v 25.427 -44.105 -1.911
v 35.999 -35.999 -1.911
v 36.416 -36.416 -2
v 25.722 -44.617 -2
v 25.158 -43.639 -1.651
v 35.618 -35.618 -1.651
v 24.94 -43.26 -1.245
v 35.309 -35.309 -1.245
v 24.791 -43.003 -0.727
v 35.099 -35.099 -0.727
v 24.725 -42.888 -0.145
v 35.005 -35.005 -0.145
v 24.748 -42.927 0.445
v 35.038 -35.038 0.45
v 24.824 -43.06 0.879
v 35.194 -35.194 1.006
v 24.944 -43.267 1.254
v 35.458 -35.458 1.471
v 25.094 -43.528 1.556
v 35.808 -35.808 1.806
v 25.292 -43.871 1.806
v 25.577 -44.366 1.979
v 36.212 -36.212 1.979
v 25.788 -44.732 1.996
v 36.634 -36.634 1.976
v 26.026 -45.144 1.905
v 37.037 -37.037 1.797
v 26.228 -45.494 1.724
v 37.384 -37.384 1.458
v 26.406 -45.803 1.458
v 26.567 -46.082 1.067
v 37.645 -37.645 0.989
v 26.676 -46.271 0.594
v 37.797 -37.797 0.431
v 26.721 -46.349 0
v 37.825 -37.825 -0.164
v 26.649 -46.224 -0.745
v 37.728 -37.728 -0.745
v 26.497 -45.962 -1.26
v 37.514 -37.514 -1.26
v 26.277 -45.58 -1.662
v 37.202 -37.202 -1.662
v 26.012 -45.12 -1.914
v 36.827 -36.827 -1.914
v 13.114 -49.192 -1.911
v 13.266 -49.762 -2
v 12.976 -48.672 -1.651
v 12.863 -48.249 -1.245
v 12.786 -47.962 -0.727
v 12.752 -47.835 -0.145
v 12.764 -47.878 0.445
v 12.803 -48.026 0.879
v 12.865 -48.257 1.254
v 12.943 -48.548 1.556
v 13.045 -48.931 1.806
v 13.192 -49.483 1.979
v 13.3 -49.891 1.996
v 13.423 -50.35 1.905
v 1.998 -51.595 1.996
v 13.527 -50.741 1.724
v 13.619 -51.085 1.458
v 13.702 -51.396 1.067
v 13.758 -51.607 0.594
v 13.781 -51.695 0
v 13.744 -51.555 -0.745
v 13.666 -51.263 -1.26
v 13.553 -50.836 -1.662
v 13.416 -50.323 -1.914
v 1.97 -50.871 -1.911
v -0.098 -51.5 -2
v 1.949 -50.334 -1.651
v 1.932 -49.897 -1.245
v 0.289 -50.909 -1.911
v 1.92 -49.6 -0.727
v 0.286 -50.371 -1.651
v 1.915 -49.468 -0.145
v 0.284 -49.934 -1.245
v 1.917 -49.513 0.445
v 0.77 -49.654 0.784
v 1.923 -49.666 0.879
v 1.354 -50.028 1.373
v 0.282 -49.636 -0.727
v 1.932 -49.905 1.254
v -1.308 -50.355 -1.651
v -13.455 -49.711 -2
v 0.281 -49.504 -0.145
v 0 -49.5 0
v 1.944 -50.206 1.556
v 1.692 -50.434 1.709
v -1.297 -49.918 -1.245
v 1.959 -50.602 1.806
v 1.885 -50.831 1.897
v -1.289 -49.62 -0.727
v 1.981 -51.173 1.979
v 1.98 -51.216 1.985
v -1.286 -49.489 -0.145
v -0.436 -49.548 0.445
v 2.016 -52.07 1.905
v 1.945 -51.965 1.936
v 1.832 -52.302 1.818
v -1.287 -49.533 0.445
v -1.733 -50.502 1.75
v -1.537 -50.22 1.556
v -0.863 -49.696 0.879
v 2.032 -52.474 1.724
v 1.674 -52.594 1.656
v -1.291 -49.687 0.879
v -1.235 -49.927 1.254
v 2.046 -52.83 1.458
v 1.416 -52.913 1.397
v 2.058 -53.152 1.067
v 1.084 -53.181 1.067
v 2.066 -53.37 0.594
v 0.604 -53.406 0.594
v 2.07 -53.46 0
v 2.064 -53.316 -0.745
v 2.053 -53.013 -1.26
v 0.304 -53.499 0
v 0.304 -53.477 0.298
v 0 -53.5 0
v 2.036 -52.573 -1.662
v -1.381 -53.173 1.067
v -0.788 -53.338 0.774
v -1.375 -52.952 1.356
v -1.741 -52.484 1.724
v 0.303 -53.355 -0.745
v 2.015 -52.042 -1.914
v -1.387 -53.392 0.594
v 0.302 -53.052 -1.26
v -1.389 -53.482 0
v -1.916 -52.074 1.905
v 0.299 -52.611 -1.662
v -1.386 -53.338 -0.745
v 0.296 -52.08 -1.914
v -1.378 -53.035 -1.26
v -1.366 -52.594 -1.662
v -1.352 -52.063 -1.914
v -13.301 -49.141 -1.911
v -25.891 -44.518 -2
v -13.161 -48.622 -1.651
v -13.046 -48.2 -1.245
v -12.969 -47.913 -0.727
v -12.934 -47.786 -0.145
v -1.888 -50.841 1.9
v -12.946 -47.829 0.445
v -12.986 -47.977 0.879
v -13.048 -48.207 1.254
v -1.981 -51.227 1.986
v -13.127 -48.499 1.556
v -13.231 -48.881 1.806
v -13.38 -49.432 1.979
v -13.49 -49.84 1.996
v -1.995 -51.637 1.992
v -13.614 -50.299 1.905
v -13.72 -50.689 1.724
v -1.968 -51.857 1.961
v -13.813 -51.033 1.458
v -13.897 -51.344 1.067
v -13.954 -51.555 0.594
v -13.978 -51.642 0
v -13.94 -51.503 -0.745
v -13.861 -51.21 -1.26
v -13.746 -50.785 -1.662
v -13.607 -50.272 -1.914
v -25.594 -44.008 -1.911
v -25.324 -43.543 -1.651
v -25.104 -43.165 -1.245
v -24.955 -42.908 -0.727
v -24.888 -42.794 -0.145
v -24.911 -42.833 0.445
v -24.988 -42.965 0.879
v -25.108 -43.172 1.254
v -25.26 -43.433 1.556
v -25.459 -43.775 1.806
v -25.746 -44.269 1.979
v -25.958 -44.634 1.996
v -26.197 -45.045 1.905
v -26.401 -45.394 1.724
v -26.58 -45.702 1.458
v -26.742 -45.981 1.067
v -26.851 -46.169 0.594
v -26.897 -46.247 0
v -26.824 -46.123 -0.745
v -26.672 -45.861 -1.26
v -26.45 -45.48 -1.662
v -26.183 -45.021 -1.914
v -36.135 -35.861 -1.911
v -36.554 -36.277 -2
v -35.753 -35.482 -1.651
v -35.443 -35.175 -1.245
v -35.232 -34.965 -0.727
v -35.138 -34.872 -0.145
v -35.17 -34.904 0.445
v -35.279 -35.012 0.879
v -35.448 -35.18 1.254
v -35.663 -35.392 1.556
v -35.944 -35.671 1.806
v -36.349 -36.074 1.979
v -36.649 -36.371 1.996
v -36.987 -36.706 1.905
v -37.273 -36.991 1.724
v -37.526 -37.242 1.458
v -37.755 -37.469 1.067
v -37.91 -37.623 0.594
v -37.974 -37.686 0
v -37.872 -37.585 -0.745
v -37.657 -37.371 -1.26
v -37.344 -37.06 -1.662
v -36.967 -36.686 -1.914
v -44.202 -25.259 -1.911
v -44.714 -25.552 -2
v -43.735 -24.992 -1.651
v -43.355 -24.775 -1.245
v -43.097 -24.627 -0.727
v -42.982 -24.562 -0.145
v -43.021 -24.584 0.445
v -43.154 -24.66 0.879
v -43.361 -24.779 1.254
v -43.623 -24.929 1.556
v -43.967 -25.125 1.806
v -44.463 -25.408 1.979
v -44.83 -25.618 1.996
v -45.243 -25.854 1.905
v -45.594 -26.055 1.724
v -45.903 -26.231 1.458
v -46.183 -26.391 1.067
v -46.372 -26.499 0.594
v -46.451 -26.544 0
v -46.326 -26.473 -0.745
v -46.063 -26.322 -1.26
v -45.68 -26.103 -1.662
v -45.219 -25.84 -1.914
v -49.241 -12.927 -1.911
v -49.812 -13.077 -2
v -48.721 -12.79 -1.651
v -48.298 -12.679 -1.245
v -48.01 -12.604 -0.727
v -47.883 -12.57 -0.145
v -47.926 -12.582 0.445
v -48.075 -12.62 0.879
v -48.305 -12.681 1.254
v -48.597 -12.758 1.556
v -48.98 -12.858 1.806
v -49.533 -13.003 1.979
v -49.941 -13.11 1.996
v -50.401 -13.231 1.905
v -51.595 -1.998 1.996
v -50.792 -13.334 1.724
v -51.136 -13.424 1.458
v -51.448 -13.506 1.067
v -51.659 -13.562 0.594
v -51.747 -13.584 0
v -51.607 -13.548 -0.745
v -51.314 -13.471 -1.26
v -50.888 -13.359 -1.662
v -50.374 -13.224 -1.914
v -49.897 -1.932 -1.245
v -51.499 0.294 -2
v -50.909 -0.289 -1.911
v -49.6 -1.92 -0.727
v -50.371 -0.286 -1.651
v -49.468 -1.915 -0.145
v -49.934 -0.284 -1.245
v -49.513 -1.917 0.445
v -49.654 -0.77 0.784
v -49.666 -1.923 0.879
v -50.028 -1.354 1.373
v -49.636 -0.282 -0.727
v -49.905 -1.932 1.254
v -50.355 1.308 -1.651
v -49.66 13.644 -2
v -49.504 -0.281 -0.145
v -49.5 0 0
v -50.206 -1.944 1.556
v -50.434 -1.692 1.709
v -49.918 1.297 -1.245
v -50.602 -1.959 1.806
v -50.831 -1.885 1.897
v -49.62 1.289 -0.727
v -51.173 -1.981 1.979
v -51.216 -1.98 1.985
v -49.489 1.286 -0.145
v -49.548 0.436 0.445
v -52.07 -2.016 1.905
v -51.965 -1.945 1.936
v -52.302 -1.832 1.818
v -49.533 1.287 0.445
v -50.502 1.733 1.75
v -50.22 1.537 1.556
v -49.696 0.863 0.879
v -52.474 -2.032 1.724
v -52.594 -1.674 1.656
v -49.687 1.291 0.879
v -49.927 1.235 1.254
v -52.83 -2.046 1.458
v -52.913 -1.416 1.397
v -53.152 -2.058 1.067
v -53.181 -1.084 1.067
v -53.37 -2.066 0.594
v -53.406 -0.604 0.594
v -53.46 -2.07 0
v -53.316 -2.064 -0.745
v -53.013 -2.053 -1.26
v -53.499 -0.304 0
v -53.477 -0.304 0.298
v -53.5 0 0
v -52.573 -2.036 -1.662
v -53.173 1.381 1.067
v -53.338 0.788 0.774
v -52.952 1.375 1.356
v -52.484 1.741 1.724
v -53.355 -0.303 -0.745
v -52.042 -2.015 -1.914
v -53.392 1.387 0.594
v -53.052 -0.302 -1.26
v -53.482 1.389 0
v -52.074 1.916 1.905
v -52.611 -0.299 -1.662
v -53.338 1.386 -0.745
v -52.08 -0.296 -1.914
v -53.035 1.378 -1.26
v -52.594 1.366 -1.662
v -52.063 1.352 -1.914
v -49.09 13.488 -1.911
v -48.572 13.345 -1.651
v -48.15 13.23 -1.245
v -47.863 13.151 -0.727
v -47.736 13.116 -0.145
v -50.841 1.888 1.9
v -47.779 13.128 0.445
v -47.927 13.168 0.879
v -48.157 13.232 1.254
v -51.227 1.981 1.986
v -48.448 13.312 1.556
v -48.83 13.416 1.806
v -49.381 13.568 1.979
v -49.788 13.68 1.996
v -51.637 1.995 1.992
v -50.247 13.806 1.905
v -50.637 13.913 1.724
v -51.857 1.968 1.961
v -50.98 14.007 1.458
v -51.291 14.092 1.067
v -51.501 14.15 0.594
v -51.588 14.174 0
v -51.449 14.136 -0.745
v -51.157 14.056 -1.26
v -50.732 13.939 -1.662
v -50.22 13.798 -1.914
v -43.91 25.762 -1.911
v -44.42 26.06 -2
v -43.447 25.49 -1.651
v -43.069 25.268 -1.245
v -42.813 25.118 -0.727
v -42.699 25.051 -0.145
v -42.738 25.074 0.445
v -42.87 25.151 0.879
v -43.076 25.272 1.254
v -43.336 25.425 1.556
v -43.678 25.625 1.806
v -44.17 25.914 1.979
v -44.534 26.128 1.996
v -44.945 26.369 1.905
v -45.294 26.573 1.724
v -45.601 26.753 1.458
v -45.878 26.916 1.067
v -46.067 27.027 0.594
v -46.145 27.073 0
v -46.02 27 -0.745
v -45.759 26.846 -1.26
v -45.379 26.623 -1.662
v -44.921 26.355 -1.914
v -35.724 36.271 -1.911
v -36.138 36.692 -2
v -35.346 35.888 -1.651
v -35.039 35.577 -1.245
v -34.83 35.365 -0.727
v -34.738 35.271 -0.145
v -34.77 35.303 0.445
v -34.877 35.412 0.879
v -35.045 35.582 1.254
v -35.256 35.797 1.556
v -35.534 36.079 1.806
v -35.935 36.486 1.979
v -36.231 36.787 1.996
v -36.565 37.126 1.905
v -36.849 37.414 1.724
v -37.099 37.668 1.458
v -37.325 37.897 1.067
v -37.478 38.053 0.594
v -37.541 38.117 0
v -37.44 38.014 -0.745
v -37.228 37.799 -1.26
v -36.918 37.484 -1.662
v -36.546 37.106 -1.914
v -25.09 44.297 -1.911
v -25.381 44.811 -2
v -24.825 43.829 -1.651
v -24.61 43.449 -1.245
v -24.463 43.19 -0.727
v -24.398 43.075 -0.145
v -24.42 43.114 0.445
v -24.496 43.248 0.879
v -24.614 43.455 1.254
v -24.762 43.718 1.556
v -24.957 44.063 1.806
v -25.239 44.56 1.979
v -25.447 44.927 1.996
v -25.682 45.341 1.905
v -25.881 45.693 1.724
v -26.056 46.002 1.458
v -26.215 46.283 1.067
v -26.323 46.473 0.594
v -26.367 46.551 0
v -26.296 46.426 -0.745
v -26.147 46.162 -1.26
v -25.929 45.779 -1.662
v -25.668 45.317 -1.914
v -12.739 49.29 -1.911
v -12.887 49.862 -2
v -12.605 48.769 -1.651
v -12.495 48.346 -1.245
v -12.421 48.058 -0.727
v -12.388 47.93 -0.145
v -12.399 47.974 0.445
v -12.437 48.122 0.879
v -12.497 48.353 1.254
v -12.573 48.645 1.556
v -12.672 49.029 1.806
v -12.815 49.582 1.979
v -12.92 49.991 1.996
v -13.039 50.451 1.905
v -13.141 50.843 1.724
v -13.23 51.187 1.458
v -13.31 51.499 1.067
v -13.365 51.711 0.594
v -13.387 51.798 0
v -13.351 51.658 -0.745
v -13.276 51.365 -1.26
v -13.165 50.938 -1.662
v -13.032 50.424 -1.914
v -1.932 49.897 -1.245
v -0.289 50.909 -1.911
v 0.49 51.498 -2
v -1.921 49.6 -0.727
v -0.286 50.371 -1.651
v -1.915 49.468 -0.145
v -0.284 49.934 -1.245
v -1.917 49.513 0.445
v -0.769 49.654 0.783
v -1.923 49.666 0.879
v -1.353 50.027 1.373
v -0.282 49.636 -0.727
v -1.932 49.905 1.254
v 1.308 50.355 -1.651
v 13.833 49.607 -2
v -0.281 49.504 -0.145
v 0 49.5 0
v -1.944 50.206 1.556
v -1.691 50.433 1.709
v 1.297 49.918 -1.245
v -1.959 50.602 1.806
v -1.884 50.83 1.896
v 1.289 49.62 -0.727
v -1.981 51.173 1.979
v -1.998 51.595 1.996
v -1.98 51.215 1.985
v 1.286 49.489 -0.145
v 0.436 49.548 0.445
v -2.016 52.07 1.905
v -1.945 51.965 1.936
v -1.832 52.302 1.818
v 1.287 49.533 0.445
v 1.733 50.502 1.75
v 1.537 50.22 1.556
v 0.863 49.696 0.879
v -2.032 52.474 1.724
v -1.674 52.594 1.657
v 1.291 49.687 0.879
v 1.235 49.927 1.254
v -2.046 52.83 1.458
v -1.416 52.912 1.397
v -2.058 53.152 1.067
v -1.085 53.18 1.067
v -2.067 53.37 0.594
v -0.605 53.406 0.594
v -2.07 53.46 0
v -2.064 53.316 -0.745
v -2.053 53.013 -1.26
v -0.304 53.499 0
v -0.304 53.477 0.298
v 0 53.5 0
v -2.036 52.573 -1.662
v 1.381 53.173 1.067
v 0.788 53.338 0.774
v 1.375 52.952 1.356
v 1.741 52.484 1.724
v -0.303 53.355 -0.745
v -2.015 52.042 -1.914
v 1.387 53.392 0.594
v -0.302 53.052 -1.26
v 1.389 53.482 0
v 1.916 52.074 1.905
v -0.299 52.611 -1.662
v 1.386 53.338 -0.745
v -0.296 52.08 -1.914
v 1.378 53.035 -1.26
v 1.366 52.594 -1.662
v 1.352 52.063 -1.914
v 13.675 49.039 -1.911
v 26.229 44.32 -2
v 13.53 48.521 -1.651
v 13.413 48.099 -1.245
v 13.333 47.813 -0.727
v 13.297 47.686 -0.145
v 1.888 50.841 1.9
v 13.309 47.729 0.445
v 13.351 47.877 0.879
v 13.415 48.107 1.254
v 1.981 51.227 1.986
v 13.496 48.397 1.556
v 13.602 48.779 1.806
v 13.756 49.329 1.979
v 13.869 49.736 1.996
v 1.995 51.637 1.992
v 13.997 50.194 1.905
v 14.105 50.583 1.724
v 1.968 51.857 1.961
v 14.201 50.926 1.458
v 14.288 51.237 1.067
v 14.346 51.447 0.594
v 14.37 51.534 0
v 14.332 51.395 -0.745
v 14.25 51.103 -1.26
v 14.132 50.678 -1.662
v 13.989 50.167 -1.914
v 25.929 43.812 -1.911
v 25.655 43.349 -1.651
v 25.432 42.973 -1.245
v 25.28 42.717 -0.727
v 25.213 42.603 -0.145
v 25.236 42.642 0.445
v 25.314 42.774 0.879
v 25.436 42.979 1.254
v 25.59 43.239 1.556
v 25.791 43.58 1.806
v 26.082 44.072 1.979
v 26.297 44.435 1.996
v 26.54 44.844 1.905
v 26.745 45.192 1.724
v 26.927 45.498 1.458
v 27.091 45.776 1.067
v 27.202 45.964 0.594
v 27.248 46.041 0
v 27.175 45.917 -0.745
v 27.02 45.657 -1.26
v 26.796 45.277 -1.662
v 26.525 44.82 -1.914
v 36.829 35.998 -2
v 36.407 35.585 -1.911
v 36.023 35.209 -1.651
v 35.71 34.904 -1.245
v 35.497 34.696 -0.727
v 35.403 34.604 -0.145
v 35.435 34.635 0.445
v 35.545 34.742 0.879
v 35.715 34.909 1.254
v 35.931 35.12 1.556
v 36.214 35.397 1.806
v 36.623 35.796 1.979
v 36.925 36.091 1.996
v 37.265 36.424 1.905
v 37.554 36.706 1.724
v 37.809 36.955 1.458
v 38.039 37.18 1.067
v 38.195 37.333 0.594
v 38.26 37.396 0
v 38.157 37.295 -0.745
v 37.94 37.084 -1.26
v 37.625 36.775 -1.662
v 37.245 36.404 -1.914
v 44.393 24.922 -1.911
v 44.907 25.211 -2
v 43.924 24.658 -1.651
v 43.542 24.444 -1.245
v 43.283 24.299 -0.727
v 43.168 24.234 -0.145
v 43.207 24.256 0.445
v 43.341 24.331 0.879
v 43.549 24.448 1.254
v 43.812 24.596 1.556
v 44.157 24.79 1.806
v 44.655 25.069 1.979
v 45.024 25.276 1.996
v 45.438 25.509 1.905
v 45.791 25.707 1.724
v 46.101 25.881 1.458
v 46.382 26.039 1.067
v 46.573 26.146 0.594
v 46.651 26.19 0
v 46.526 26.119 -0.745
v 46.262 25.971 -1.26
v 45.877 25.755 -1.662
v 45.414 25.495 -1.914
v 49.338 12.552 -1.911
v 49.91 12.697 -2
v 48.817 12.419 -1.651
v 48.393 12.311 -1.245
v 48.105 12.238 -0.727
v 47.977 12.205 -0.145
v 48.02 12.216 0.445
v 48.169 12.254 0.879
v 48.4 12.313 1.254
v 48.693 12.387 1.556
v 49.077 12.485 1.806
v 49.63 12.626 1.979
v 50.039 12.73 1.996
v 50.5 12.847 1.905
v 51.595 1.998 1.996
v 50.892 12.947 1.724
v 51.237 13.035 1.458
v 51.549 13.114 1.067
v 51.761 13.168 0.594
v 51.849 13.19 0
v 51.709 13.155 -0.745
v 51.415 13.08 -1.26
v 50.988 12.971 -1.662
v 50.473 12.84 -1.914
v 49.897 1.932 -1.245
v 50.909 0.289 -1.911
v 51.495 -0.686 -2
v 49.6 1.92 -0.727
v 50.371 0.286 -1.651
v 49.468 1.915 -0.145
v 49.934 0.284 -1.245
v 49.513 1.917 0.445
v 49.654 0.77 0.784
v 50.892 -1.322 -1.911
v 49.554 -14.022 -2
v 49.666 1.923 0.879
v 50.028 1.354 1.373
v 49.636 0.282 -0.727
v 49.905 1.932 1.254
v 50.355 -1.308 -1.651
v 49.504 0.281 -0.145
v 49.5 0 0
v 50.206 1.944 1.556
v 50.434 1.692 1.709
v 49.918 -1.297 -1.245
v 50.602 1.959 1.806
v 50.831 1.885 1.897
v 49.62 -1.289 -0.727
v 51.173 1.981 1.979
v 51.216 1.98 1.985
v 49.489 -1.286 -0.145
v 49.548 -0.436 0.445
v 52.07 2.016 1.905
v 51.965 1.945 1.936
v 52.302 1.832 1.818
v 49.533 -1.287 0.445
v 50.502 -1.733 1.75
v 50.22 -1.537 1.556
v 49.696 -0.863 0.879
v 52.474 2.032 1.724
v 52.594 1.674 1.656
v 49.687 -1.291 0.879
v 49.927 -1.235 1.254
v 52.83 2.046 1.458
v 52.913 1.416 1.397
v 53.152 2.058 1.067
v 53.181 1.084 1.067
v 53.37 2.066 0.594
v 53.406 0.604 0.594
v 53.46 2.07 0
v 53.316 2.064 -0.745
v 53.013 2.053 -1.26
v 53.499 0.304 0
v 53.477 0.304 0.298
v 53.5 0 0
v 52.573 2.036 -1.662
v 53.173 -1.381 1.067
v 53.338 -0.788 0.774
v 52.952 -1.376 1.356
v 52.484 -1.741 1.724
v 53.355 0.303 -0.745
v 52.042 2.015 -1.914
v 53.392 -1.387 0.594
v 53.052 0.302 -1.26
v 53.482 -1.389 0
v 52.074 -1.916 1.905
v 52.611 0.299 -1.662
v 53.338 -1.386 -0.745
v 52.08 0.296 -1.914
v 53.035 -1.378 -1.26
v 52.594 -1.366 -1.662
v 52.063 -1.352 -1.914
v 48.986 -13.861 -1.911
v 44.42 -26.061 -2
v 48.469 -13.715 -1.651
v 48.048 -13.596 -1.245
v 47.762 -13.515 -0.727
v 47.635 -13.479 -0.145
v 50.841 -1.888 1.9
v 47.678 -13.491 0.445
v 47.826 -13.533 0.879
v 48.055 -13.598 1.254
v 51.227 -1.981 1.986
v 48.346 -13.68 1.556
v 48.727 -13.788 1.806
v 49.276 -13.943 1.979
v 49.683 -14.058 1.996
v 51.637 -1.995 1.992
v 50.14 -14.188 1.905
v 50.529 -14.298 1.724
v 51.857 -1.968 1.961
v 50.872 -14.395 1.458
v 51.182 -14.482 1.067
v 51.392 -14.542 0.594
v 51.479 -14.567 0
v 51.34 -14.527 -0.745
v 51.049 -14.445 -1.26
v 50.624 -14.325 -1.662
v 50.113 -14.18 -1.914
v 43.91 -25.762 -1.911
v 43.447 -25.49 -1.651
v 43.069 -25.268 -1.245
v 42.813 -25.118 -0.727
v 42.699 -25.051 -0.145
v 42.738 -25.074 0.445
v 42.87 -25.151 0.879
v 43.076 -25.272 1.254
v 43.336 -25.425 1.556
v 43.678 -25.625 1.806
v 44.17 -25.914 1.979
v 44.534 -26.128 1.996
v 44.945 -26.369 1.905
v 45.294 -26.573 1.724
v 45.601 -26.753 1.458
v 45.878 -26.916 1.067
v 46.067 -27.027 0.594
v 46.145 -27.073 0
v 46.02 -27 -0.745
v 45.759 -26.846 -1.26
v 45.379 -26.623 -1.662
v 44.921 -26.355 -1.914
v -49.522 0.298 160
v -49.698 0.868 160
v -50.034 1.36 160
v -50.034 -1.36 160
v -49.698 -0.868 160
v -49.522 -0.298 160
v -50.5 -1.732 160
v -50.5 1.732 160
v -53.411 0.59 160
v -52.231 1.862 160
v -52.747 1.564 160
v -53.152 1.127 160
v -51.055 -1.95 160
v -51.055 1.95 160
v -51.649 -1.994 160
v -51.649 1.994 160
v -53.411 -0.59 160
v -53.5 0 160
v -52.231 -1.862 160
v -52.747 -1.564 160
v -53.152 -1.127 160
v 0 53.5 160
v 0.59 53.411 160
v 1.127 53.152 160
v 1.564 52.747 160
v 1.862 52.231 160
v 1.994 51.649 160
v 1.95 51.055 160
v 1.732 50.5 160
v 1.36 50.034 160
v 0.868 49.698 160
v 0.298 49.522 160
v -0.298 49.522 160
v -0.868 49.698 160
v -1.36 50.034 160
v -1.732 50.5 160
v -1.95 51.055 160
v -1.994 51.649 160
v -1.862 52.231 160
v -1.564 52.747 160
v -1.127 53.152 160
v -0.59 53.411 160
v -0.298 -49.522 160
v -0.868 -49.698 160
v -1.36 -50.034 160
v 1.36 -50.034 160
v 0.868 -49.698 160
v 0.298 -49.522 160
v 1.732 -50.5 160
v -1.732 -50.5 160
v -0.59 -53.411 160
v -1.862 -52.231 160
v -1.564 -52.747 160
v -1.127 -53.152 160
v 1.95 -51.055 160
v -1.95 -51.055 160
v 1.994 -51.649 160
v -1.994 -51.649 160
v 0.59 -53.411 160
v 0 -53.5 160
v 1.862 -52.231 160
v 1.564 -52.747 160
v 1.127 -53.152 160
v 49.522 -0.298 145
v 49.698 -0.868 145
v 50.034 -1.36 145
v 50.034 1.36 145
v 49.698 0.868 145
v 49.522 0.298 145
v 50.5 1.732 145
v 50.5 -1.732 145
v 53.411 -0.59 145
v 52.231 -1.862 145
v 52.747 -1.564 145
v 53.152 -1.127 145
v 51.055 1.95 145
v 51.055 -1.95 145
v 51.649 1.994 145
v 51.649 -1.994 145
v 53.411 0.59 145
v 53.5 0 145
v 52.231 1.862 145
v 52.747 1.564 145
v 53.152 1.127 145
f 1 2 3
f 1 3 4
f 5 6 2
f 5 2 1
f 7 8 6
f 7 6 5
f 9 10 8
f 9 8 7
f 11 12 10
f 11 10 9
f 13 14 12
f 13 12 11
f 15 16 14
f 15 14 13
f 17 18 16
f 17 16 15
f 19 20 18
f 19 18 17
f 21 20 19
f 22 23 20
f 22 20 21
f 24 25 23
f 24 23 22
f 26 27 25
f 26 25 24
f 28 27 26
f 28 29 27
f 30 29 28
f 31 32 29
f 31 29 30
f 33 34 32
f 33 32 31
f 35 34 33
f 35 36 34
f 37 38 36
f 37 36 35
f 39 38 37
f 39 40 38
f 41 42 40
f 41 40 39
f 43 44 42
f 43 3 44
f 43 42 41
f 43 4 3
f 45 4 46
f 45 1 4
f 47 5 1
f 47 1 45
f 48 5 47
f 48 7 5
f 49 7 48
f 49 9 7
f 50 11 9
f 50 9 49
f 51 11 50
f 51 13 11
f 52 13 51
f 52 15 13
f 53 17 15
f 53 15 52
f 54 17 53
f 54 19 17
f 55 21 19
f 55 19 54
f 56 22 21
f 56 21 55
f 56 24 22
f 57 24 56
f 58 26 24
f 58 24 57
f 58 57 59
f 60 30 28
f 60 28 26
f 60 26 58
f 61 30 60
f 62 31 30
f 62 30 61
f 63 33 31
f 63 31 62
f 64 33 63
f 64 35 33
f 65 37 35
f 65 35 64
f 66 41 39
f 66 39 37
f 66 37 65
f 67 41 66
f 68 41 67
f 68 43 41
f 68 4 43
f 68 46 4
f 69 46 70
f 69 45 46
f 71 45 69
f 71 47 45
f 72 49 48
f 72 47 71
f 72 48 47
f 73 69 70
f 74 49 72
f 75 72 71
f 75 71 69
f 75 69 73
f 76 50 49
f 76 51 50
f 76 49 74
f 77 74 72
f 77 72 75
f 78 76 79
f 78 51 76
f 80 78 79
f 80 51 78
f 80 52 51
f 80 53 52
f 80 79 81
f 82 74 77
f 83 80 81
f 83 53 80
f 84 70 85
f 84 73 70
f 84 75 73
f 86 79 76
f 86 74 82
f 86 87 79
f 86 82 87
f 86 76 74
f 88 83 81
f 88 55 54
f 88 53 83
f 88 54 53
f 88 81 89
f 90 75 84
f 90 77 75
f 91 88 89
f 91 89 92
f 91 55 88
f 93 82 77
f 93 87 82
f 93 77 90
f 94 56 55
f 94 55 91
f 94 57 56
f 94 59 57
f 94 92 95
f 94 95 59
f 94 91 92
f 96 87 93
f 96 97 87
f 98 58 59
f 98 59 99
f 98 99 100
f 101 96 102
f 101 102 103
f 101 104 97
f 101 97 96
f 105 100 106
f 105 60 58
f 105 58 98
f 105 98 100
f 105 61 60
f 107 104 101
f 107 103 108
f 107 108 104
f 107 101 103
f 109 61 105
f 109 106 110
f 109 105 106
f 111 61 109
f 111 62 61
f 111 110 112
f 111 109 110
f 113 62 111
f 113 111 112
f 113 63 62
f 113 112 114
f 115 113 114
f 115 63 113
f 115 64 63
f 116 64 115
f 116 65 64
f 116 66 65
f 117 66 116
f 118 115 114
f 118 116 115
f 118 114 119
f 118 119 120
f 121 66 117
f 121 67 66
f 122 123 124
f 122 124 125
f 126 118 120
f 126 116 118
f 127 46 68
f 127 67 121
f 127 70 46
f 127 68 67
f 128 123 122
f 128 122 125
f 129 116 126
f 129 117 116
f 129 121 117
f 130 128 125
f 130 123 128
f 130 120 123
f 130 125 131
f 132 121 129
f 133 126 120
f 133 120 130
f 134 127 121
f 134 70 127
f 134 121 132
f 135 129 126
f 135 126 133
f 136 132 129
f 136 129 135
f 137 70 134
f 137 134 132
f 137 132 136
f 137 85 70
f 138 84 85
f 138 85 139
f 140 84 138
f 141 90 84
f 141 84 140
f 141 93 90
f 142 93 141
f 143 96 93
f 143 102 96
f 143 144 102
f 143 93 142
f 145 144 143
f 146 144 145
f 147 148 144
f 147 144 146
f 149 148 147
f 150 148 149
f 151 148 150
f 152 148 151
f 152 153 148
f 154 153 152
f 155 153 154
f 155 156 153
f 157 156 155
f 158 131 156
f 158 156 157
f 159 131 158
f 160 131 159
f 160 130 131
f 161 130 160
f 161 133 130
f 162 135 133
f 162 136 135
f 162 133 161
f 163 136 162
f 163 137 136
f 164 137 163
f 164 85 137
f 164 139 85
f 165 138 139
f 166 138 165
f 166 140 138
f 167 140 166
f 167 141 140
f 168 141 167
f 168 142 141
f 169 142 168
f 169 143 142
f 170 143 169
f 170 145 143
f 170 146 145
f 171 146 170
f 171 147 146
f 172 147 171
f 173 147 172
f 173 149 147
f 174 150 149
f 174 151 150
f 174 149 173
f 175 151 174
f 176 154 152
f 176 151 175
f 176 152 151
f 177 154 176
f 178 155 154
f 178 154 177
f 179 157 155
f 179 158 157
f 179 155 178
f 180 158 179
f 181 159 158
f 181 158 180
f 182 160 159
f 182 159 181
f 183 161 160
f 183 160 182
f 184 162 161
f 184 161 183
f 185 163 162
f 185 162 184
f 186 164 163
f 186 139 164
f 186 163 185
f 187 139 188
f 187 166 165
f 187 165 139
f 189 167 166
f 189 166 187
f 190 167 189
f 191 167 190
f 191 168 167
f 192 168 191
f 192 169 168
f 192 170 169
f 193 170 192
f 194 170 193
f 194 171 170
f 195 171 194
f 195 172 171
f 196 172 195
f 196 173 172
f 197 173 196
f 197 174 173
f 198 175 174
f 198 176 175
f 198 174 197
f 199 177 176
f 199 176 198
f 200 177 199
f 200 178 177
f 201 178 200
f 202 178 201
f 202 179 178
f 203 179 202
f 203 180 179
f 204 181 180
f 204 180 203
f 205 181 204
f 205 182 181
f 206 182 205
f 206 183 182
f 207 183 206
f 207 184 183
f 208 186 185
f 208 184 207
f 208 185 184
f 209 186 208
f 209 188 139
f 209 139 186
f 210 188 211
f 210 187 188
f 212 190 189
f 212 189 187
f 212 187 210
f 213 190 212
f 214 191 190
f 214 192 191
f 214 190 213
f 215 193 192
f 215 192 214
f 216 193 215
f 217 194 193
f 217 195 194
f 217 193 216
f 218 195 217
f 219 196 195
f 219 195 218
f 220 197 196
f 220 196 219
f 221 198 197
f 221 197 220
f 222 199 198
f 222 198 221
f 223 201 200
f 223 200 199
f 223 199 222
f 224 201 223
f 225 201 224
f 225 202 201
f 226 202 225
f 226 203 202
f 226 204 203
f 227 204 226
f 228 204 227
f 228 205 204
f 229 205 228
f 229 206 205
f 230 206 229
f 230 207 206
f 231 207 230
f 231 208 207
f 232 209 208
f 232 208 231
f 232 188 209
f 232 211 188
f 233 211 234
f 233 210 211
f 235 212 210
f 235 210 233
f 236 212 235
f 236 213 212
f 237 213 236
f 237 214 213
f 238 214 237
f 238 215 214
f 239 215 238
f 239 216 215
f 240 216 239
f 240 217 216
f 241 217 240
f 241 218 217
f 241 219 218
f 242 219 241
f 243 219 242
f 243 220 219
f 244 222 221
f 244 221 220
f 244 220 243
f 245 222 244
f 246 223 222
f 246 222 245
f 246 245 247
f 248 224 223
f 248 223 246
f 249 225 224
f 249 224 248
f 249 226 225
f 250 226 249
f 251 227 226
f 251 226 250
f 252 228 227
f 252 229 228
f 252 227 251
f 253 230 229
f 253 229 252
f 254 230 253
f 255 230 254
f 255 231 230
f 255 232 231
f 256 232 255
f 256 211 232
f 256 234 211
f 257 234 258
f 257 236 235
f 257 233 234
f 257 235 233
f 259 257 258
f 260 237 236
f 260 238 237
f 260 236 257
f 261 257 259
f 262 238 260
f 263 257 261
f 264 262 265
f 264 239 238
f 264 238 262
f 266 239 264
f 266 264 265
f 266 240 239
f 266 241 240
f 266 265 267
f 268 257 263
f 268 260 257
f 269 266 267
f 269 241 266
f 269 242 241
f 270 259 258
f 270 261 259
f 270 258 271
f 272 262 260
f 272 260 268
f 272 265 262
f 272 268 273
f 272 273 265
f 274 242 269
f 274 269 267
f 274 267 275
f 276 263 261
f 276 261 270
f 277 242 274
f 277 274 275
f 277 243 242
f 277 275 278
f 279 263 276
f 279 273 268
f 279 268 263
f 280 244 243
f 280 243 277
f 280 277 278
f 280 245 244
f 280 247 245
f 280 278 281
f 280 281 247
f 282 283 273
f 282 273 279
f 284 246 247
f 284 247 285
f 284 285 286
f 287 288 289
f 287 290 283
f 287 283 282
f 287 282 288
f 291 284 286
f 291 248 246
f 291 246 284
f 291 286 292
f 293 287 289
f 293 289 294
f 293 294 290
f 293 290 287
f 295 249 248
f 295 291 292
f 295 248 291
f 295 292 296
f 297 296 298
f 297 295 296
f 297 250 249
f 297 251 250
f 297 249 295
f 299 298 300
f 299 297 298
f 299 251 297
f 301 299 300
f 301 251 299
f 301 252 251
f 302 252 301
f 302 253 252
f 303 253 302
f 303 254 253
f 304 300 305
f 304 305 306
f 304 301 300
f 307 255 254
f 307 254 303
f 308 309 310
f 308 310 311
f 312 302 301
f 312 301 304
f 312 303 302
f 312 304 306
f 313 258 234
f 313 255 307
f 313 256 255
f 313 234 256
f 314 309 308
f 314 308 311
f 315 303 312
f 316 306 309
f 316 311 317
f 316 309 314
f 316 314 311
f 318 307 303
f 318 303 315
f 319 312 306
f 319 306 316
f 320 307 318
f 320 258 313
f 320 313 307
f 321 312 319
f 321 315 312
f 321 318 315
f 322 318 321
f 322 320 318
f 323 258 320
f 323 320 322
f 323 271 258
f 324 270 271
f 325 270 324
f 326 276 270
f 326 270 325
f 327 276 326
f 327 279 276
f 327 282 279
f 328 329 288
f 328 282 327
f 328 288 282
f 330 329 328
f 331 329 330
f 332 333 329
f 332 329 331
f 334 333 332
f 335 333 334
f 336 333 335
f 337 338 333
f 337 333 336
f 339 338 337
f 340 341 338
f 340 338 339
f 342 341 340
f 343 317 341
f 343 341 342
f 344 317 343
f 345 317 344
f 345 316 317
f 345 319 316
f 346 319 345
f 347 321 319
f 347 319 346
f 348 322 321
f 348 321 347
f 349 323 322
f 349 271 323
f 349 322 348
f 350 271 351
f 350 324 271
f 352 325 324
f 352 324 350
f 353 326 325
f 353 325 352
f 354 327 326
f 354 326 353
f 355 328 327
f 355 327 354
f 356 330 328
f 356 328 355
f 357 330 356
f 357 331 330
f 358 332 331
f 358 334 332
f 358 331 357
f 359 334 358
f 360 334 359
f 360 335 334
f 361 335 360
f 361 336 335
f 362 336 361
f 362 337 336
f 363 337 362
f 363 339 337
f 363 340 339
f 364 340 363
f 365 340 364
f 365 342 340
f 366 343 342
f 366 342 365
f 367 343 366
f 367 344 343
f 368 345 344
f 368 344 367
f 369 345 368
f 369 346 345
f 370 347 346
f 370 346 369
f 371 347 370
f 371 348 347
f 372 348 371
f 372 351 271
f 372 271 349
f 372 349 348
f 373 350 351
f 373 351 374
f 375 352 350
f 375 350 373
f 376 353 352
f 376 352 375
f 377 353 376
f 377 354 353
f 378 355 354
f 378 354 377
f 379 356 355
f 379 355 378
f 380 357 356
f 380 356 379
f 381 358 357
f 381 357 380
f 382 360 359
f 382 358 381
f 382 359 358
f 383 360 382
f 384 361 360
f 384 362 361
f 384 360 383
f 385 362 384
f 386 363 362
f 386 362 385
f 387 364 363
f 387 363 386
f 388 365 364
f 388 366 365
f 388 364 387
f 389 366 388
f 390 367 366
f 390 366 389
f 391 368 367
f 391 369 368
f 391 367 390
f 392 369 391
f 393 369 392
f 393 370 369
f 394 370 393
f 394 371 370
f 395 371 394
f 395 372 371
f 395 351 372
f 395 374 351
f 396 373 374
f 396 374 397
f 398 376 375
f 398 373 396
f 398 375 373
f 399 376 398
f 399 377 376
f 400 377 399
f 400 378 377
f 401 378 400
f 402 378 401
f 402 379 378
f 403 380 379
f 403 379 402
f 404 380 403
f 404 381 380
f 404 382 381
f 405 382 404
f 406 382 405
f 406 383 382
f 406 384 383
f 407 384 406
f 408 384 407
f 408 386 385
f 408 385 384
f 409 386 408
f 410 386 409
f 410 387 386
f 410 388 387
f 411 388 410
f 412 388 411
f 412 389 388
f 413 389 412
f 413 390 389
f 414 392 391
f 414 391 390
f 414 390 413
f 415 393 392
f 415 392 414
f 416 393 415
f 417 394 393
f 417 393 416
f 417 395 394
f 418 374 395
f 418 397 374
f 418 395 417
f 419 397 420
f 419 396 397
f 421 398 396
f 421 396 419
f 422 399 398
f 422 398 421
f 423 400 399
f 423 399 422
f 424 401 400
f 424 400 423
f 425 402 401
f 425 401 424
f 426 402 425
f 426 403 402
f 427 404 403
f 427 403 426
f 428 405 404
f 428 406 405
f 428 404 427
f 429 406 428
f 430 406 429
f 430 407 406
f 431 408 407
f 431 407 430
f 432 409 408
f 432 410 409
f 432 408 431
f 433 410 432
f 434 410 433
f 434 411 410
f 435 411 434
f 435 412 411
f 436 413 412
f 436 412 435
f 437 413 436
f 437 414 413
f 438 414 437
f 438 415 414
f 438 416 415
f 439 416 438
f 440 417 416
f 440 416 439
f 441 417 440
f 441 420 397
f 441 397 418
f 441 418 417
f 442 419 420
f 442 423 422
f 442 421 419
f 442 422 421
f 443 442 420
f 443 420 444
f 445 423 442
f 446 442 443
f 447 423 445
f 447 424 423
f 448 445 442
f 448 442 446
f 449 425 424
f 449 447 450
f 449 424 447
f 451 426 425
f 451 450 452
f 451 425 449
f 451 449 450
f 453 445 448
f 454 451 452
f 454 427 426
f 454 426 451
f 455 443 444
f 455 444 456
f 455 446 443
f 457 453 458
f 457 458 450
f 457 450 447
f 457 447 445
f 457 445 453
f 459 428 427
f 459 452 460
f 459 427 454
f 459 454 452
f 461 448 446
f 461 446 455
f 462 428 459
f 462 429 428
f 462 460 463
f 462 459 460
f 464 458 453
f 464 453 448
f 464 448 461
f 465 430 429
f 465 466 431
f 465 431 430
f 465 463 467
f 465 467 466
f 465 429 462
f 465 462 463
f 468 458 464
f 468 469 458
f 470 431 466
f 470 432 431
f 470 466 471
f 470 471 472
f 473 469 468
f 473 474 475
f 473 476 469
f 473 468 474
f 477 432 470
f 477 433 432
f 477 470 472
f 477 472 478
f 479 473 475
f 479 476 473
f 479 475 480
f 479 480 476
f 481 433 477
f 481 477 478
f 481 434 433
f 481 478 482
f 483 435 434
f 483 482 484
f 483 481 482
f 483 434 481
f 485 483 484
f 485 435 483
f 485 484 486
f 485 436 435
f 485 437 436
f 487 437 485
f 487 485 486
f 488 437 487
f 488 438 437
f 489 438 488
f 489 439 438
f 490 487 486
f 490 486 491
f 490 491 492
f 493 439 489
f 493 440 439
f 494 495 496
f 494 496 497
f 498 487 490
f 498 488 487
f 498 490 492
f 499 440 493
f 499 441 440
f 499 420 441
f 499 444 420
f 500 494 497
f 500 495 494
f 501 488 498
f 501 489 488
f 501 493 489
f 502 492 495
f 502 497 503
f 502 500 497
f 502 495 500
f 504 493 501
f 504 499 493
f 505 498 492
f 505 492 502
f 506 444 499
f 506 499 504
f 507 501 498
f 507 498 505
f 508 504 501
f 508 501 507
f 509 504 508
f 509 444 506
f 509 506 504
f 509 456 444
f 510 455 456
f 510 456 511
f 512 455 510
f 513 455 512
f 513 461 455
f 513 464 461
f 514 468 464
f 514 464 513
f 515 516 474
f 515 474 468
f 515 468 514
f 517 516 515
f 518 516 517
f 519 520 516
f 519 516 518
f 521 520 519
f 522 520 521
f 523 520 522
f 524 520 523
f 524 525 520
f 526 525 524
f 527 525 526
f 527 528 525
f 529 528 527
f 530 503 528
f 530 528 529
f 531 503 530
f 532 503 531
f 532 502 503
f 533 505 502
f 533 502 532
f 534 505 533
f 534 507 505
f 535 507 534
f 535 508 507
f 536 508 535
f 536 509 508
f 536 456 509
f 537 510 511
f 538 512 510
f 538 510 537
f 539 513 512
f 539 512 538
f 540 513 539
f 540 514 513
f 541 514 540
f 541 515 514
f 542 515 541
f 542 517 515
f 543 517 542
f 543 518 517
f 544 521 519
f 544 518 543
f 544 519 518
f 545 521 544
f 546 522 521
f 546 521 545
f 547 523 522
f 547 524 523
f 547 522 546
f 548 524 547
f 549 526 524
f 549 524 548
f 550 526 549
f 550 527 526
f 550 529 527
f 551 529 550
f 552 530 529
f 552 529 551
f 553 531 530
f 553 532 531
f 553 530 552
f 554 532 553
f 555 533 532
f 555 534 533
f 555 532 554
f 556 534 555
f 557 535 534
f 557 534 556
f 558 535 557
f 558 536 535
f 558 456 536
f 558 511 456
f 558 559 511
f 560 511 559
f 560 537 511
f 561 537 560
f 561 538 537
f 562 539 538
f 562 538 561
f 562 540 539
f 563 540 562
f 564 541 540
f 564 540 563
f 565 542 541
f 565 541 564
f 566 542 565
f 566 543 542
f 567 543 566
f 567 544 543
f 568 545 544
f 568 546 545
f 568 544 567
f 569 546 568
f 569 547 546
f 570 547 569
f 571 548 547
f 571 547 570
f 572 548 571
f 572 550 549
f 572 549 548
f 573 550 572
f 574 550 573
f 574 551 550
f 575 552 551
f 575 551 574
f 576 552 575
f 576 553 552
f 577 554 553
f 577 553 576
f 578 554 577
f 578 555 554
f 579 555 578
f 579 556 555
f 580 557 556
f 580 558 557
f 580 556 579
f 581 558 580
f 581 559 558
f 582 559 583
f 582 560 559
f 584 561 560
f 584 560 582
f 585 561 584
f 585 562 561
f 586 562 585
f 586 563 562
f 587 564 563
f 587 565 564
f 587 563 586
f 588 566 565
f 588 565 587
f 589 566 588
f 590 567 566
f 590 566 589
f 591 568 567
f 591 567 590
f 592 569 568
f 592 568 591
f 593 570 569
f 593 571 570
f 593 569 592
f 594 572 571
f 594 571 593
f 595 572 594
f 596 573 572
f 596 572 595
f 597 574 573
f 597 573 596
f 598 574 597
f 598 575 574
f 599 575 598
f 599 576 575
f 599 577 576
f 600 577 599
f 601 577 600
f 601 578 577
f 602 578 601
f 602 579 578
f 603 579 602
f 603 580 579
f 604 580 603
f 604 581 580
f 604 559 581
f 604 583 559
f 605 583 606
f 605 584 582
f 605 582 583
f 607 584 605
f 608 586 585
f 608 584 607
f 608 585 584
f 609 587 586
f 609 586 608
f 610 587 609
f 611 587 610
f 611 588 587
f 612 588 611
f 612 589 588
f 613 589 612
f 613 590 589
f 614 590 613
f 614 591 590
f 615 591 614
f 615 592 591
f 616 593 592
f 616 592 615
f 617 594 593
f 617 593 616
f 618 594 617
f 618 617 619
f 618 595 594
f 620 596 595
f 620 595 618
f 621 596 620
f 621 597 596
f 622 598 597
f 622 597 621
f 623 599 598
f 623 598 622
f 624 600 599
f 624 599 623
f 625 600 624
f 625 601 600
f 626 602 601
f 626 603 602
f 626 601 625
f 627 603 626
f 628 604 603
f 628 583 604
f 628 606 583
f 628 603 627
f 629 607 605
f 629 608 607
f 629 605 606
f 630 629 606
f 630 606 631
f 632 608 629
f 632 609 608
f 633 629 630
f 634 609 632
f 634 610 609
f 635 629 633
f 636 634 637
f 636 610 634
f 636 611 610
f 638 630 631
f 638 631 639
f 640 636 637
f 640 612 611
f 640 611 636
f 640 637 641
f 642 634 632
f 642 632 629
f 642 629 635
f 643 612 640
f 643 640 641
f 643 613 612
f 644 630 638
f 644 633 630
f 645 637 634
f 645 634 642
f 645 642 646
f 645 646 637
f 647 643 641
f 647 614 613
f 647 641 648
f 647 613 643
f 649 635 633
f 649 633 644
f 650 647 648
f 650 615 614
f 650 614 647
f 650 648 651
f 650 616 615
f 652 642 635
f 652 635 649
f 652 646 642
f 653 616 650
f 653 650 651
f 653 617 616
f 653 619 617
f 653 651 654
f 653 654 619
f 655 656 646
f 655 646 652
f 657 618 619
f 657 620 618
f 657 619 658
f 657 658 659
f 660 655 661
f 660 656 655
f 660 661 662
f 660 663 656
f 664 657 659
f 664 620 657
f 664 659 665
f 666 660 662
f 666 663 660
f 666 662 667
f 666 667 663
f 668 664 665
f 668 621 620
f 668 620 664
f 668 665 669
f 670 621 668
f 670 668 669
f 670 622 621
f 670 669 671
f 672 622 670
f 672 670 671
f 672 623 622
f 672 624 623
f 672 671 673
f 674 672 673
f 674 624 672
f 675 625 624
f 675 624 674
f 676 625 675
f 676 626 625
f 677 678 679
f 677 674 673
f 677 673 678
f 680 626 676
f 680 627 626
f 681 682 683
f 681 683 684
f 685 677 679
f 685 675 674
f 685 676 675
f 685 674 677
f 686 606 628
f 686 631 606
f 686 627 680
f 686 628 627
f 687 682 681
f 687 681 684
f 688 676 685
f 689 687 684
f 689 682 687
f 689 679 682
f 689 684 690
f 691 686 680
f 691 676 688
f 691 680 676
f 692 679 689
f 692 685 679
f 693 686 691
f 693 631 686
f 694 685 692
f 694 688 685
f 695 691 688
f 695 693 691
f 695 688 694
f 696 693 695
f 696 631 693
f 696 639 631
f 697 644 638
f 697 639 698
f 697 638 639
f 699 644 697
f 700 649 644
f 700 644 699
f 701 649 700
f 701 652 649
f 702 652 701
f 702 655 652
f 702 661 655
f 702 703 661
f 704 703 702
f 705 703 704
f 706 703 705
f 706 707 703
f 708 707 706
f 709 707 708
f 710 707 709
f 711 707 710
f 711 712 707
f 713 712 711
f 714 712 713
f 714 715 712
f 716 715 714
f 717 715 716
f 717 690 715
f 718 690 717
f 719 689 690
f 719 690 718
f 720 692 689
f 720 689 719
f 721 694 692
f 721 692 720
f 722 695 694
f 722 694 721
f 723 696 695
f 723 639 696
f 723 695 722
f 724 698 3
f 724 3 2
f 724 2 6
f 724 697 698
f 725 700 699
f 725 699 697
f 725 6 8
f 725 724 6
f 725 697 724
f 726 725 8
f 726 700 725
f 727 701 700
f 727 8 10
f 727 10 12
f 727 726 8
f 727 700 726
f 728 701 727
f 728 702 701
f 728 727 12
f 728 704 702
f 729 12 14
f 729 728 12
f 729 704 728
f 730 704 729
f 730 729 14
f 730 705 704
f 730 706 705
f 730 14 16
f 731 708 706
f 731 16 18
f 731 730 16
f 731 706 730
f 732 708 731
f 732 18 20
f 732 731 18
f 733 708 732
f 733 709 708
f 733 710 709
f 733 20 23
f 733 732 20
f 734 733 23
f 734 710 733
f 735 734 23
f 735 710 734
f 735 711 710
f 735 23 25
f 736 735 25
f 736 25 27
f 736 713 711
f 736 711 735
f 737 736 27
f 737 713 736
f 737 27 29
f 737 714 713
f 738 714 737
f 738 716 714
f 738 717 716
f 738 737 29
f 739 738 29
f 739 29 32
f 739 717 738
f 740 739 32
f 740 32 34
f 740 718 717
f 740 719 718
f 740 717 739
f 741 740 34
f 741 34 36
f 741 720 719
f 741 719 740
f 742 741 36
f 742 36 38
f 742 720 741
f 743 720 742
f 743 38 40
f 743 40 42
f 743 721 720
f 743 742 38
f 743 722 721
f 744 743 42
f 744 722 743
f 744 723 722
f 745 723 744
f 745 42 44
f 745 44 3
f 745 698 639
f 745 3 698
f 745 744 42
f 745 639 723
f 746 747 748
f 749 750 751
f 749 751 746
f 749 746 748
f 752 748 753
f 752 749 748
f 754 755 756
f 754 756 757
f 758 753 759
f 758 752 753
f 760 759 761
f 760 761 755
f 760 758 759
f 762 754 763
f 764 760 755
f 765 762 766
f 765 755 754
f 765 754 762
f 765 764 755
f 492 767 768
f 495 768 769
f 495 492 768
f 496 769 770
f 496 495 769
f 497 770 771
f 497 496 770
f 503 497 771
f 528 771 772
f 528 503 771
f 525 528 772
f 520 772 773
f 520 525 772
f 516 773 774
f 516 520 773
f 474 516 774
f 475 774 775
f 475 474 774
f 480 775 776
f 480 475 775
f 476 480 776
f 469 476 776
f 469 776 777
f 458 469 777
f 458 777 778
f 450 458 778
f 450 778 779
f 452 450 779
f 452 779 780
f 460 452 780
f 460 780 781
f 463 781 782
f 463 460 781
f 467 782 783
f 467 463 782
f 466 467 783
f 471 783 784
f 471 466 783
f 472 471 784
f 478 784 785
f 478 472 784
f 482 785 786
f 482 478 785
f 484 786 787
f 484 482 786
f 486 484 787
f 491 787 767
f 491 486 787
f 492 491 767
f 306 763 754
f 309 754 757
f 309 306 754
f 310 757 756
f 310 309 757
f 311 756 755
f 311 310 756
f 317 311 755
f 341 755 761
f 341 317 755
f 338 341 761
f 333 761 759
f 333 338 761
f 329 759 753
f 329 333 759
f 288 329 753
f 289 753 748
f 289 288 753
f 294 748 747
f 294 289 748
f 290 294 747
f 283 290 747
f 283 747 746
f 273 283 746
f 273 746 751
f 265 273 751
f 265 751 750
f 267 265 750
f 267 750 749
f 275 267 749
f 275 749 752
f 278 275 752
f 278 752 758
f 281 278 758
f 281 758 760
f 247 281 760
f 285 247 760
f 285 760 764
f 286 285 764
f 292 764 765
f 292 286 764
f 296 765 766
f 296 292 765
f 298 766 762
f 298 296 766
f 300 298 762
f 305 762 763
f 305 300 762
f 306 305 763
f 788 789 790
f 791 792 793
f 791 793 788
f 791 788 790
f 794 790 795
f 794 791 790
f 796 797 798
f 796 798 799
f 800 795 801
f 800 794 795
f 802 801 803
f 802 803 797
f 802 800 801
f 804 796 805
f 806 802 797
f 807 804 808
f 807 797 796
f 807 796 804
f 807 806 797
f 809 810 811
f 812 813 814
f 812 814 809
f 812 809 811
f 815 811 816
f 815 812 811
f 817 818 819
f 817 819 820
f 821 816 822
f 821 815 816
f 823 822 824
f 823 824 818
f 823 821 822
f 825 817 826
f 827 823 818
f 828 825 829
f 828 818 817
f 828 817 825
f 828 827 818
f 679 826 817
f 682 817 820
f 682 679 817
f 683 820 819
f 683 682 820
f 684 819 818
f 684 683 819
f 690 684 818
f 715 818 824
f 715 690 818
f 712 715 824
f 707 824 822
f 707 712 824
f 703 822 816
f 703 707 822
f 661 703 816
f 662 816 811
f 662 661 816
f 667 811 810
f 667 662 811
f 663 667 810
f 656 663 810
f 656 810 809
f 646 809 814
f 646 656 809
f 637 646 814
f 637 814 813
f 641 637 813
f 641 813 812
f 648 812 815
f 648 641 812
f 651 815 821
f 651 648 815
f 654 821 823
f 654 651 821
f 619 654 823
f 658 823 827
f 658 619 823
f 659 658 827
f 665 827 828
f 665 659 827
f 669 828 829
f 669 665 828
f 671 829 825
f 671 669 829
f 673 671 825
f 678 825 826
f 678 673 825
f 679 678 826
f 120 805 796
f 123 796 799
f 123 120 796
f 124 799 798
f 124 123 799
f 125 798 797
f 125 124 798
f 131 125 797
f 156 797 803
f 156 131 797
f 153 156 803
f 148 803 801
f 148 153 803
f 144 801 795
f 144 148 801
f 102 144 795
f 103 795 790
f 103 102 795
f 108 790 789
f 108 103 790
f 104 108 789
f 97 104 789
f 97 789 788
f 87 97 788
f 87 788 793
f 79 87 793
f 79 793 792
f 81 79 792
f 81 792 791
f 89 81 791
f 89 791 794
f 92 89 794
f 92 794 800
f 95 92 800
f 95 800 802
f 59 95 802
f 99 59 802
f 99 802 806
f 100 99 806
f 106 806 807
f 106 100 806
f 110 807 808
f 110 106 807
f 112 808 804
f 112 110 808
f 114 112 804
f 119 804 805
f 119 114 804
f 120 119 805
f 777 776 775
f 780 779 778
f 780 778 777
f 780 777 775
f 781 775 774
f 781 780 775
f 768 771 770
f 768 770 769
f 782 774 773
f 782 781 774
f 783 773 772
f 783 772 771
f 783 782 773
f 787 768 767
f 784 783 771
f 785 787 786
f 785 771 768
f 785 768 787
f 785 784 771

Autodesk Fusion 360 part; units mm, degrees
sketch "Skizze1" plane through (0, 0, 0) normal (0, 1, 0) x (1, 0, 0)
  circle A0 centre (51.5, 0) radius 2
  dimension "d1" = 4
  dimension "d2" = 51.5
revolve "Drehen1" add sketch "Skizze1" angle 360 about axis through (0, 0, 1.75) along (0, 0, 1)
sketch "Skizze2" plane through (0, 0, 0) normal (0, 0, 1) x (1, 0, 0)
  circle A0 centre (51.5, 0) radius 2
  dimension "d4" = 4
  dimension "d5" = 51.5
extrude "Extrusion1" add sketch "Skizze2" along normal blind 160
pattern_circular "C-Anordnung1" count 4 over 360 about axis through (0, 0, 1.75) along (0, 0, 1) of "Extrusion1"
extrude "Extrusion2" cut 2 faces at (51.5487, 0.65, 160) (51.5487, 0.65, 160) along direction (0, 0, -1) blind 15
thread "Gewinde1" thread offset 0 thread length 37
equation "d4 = d1"
equation "d5 = d2"
